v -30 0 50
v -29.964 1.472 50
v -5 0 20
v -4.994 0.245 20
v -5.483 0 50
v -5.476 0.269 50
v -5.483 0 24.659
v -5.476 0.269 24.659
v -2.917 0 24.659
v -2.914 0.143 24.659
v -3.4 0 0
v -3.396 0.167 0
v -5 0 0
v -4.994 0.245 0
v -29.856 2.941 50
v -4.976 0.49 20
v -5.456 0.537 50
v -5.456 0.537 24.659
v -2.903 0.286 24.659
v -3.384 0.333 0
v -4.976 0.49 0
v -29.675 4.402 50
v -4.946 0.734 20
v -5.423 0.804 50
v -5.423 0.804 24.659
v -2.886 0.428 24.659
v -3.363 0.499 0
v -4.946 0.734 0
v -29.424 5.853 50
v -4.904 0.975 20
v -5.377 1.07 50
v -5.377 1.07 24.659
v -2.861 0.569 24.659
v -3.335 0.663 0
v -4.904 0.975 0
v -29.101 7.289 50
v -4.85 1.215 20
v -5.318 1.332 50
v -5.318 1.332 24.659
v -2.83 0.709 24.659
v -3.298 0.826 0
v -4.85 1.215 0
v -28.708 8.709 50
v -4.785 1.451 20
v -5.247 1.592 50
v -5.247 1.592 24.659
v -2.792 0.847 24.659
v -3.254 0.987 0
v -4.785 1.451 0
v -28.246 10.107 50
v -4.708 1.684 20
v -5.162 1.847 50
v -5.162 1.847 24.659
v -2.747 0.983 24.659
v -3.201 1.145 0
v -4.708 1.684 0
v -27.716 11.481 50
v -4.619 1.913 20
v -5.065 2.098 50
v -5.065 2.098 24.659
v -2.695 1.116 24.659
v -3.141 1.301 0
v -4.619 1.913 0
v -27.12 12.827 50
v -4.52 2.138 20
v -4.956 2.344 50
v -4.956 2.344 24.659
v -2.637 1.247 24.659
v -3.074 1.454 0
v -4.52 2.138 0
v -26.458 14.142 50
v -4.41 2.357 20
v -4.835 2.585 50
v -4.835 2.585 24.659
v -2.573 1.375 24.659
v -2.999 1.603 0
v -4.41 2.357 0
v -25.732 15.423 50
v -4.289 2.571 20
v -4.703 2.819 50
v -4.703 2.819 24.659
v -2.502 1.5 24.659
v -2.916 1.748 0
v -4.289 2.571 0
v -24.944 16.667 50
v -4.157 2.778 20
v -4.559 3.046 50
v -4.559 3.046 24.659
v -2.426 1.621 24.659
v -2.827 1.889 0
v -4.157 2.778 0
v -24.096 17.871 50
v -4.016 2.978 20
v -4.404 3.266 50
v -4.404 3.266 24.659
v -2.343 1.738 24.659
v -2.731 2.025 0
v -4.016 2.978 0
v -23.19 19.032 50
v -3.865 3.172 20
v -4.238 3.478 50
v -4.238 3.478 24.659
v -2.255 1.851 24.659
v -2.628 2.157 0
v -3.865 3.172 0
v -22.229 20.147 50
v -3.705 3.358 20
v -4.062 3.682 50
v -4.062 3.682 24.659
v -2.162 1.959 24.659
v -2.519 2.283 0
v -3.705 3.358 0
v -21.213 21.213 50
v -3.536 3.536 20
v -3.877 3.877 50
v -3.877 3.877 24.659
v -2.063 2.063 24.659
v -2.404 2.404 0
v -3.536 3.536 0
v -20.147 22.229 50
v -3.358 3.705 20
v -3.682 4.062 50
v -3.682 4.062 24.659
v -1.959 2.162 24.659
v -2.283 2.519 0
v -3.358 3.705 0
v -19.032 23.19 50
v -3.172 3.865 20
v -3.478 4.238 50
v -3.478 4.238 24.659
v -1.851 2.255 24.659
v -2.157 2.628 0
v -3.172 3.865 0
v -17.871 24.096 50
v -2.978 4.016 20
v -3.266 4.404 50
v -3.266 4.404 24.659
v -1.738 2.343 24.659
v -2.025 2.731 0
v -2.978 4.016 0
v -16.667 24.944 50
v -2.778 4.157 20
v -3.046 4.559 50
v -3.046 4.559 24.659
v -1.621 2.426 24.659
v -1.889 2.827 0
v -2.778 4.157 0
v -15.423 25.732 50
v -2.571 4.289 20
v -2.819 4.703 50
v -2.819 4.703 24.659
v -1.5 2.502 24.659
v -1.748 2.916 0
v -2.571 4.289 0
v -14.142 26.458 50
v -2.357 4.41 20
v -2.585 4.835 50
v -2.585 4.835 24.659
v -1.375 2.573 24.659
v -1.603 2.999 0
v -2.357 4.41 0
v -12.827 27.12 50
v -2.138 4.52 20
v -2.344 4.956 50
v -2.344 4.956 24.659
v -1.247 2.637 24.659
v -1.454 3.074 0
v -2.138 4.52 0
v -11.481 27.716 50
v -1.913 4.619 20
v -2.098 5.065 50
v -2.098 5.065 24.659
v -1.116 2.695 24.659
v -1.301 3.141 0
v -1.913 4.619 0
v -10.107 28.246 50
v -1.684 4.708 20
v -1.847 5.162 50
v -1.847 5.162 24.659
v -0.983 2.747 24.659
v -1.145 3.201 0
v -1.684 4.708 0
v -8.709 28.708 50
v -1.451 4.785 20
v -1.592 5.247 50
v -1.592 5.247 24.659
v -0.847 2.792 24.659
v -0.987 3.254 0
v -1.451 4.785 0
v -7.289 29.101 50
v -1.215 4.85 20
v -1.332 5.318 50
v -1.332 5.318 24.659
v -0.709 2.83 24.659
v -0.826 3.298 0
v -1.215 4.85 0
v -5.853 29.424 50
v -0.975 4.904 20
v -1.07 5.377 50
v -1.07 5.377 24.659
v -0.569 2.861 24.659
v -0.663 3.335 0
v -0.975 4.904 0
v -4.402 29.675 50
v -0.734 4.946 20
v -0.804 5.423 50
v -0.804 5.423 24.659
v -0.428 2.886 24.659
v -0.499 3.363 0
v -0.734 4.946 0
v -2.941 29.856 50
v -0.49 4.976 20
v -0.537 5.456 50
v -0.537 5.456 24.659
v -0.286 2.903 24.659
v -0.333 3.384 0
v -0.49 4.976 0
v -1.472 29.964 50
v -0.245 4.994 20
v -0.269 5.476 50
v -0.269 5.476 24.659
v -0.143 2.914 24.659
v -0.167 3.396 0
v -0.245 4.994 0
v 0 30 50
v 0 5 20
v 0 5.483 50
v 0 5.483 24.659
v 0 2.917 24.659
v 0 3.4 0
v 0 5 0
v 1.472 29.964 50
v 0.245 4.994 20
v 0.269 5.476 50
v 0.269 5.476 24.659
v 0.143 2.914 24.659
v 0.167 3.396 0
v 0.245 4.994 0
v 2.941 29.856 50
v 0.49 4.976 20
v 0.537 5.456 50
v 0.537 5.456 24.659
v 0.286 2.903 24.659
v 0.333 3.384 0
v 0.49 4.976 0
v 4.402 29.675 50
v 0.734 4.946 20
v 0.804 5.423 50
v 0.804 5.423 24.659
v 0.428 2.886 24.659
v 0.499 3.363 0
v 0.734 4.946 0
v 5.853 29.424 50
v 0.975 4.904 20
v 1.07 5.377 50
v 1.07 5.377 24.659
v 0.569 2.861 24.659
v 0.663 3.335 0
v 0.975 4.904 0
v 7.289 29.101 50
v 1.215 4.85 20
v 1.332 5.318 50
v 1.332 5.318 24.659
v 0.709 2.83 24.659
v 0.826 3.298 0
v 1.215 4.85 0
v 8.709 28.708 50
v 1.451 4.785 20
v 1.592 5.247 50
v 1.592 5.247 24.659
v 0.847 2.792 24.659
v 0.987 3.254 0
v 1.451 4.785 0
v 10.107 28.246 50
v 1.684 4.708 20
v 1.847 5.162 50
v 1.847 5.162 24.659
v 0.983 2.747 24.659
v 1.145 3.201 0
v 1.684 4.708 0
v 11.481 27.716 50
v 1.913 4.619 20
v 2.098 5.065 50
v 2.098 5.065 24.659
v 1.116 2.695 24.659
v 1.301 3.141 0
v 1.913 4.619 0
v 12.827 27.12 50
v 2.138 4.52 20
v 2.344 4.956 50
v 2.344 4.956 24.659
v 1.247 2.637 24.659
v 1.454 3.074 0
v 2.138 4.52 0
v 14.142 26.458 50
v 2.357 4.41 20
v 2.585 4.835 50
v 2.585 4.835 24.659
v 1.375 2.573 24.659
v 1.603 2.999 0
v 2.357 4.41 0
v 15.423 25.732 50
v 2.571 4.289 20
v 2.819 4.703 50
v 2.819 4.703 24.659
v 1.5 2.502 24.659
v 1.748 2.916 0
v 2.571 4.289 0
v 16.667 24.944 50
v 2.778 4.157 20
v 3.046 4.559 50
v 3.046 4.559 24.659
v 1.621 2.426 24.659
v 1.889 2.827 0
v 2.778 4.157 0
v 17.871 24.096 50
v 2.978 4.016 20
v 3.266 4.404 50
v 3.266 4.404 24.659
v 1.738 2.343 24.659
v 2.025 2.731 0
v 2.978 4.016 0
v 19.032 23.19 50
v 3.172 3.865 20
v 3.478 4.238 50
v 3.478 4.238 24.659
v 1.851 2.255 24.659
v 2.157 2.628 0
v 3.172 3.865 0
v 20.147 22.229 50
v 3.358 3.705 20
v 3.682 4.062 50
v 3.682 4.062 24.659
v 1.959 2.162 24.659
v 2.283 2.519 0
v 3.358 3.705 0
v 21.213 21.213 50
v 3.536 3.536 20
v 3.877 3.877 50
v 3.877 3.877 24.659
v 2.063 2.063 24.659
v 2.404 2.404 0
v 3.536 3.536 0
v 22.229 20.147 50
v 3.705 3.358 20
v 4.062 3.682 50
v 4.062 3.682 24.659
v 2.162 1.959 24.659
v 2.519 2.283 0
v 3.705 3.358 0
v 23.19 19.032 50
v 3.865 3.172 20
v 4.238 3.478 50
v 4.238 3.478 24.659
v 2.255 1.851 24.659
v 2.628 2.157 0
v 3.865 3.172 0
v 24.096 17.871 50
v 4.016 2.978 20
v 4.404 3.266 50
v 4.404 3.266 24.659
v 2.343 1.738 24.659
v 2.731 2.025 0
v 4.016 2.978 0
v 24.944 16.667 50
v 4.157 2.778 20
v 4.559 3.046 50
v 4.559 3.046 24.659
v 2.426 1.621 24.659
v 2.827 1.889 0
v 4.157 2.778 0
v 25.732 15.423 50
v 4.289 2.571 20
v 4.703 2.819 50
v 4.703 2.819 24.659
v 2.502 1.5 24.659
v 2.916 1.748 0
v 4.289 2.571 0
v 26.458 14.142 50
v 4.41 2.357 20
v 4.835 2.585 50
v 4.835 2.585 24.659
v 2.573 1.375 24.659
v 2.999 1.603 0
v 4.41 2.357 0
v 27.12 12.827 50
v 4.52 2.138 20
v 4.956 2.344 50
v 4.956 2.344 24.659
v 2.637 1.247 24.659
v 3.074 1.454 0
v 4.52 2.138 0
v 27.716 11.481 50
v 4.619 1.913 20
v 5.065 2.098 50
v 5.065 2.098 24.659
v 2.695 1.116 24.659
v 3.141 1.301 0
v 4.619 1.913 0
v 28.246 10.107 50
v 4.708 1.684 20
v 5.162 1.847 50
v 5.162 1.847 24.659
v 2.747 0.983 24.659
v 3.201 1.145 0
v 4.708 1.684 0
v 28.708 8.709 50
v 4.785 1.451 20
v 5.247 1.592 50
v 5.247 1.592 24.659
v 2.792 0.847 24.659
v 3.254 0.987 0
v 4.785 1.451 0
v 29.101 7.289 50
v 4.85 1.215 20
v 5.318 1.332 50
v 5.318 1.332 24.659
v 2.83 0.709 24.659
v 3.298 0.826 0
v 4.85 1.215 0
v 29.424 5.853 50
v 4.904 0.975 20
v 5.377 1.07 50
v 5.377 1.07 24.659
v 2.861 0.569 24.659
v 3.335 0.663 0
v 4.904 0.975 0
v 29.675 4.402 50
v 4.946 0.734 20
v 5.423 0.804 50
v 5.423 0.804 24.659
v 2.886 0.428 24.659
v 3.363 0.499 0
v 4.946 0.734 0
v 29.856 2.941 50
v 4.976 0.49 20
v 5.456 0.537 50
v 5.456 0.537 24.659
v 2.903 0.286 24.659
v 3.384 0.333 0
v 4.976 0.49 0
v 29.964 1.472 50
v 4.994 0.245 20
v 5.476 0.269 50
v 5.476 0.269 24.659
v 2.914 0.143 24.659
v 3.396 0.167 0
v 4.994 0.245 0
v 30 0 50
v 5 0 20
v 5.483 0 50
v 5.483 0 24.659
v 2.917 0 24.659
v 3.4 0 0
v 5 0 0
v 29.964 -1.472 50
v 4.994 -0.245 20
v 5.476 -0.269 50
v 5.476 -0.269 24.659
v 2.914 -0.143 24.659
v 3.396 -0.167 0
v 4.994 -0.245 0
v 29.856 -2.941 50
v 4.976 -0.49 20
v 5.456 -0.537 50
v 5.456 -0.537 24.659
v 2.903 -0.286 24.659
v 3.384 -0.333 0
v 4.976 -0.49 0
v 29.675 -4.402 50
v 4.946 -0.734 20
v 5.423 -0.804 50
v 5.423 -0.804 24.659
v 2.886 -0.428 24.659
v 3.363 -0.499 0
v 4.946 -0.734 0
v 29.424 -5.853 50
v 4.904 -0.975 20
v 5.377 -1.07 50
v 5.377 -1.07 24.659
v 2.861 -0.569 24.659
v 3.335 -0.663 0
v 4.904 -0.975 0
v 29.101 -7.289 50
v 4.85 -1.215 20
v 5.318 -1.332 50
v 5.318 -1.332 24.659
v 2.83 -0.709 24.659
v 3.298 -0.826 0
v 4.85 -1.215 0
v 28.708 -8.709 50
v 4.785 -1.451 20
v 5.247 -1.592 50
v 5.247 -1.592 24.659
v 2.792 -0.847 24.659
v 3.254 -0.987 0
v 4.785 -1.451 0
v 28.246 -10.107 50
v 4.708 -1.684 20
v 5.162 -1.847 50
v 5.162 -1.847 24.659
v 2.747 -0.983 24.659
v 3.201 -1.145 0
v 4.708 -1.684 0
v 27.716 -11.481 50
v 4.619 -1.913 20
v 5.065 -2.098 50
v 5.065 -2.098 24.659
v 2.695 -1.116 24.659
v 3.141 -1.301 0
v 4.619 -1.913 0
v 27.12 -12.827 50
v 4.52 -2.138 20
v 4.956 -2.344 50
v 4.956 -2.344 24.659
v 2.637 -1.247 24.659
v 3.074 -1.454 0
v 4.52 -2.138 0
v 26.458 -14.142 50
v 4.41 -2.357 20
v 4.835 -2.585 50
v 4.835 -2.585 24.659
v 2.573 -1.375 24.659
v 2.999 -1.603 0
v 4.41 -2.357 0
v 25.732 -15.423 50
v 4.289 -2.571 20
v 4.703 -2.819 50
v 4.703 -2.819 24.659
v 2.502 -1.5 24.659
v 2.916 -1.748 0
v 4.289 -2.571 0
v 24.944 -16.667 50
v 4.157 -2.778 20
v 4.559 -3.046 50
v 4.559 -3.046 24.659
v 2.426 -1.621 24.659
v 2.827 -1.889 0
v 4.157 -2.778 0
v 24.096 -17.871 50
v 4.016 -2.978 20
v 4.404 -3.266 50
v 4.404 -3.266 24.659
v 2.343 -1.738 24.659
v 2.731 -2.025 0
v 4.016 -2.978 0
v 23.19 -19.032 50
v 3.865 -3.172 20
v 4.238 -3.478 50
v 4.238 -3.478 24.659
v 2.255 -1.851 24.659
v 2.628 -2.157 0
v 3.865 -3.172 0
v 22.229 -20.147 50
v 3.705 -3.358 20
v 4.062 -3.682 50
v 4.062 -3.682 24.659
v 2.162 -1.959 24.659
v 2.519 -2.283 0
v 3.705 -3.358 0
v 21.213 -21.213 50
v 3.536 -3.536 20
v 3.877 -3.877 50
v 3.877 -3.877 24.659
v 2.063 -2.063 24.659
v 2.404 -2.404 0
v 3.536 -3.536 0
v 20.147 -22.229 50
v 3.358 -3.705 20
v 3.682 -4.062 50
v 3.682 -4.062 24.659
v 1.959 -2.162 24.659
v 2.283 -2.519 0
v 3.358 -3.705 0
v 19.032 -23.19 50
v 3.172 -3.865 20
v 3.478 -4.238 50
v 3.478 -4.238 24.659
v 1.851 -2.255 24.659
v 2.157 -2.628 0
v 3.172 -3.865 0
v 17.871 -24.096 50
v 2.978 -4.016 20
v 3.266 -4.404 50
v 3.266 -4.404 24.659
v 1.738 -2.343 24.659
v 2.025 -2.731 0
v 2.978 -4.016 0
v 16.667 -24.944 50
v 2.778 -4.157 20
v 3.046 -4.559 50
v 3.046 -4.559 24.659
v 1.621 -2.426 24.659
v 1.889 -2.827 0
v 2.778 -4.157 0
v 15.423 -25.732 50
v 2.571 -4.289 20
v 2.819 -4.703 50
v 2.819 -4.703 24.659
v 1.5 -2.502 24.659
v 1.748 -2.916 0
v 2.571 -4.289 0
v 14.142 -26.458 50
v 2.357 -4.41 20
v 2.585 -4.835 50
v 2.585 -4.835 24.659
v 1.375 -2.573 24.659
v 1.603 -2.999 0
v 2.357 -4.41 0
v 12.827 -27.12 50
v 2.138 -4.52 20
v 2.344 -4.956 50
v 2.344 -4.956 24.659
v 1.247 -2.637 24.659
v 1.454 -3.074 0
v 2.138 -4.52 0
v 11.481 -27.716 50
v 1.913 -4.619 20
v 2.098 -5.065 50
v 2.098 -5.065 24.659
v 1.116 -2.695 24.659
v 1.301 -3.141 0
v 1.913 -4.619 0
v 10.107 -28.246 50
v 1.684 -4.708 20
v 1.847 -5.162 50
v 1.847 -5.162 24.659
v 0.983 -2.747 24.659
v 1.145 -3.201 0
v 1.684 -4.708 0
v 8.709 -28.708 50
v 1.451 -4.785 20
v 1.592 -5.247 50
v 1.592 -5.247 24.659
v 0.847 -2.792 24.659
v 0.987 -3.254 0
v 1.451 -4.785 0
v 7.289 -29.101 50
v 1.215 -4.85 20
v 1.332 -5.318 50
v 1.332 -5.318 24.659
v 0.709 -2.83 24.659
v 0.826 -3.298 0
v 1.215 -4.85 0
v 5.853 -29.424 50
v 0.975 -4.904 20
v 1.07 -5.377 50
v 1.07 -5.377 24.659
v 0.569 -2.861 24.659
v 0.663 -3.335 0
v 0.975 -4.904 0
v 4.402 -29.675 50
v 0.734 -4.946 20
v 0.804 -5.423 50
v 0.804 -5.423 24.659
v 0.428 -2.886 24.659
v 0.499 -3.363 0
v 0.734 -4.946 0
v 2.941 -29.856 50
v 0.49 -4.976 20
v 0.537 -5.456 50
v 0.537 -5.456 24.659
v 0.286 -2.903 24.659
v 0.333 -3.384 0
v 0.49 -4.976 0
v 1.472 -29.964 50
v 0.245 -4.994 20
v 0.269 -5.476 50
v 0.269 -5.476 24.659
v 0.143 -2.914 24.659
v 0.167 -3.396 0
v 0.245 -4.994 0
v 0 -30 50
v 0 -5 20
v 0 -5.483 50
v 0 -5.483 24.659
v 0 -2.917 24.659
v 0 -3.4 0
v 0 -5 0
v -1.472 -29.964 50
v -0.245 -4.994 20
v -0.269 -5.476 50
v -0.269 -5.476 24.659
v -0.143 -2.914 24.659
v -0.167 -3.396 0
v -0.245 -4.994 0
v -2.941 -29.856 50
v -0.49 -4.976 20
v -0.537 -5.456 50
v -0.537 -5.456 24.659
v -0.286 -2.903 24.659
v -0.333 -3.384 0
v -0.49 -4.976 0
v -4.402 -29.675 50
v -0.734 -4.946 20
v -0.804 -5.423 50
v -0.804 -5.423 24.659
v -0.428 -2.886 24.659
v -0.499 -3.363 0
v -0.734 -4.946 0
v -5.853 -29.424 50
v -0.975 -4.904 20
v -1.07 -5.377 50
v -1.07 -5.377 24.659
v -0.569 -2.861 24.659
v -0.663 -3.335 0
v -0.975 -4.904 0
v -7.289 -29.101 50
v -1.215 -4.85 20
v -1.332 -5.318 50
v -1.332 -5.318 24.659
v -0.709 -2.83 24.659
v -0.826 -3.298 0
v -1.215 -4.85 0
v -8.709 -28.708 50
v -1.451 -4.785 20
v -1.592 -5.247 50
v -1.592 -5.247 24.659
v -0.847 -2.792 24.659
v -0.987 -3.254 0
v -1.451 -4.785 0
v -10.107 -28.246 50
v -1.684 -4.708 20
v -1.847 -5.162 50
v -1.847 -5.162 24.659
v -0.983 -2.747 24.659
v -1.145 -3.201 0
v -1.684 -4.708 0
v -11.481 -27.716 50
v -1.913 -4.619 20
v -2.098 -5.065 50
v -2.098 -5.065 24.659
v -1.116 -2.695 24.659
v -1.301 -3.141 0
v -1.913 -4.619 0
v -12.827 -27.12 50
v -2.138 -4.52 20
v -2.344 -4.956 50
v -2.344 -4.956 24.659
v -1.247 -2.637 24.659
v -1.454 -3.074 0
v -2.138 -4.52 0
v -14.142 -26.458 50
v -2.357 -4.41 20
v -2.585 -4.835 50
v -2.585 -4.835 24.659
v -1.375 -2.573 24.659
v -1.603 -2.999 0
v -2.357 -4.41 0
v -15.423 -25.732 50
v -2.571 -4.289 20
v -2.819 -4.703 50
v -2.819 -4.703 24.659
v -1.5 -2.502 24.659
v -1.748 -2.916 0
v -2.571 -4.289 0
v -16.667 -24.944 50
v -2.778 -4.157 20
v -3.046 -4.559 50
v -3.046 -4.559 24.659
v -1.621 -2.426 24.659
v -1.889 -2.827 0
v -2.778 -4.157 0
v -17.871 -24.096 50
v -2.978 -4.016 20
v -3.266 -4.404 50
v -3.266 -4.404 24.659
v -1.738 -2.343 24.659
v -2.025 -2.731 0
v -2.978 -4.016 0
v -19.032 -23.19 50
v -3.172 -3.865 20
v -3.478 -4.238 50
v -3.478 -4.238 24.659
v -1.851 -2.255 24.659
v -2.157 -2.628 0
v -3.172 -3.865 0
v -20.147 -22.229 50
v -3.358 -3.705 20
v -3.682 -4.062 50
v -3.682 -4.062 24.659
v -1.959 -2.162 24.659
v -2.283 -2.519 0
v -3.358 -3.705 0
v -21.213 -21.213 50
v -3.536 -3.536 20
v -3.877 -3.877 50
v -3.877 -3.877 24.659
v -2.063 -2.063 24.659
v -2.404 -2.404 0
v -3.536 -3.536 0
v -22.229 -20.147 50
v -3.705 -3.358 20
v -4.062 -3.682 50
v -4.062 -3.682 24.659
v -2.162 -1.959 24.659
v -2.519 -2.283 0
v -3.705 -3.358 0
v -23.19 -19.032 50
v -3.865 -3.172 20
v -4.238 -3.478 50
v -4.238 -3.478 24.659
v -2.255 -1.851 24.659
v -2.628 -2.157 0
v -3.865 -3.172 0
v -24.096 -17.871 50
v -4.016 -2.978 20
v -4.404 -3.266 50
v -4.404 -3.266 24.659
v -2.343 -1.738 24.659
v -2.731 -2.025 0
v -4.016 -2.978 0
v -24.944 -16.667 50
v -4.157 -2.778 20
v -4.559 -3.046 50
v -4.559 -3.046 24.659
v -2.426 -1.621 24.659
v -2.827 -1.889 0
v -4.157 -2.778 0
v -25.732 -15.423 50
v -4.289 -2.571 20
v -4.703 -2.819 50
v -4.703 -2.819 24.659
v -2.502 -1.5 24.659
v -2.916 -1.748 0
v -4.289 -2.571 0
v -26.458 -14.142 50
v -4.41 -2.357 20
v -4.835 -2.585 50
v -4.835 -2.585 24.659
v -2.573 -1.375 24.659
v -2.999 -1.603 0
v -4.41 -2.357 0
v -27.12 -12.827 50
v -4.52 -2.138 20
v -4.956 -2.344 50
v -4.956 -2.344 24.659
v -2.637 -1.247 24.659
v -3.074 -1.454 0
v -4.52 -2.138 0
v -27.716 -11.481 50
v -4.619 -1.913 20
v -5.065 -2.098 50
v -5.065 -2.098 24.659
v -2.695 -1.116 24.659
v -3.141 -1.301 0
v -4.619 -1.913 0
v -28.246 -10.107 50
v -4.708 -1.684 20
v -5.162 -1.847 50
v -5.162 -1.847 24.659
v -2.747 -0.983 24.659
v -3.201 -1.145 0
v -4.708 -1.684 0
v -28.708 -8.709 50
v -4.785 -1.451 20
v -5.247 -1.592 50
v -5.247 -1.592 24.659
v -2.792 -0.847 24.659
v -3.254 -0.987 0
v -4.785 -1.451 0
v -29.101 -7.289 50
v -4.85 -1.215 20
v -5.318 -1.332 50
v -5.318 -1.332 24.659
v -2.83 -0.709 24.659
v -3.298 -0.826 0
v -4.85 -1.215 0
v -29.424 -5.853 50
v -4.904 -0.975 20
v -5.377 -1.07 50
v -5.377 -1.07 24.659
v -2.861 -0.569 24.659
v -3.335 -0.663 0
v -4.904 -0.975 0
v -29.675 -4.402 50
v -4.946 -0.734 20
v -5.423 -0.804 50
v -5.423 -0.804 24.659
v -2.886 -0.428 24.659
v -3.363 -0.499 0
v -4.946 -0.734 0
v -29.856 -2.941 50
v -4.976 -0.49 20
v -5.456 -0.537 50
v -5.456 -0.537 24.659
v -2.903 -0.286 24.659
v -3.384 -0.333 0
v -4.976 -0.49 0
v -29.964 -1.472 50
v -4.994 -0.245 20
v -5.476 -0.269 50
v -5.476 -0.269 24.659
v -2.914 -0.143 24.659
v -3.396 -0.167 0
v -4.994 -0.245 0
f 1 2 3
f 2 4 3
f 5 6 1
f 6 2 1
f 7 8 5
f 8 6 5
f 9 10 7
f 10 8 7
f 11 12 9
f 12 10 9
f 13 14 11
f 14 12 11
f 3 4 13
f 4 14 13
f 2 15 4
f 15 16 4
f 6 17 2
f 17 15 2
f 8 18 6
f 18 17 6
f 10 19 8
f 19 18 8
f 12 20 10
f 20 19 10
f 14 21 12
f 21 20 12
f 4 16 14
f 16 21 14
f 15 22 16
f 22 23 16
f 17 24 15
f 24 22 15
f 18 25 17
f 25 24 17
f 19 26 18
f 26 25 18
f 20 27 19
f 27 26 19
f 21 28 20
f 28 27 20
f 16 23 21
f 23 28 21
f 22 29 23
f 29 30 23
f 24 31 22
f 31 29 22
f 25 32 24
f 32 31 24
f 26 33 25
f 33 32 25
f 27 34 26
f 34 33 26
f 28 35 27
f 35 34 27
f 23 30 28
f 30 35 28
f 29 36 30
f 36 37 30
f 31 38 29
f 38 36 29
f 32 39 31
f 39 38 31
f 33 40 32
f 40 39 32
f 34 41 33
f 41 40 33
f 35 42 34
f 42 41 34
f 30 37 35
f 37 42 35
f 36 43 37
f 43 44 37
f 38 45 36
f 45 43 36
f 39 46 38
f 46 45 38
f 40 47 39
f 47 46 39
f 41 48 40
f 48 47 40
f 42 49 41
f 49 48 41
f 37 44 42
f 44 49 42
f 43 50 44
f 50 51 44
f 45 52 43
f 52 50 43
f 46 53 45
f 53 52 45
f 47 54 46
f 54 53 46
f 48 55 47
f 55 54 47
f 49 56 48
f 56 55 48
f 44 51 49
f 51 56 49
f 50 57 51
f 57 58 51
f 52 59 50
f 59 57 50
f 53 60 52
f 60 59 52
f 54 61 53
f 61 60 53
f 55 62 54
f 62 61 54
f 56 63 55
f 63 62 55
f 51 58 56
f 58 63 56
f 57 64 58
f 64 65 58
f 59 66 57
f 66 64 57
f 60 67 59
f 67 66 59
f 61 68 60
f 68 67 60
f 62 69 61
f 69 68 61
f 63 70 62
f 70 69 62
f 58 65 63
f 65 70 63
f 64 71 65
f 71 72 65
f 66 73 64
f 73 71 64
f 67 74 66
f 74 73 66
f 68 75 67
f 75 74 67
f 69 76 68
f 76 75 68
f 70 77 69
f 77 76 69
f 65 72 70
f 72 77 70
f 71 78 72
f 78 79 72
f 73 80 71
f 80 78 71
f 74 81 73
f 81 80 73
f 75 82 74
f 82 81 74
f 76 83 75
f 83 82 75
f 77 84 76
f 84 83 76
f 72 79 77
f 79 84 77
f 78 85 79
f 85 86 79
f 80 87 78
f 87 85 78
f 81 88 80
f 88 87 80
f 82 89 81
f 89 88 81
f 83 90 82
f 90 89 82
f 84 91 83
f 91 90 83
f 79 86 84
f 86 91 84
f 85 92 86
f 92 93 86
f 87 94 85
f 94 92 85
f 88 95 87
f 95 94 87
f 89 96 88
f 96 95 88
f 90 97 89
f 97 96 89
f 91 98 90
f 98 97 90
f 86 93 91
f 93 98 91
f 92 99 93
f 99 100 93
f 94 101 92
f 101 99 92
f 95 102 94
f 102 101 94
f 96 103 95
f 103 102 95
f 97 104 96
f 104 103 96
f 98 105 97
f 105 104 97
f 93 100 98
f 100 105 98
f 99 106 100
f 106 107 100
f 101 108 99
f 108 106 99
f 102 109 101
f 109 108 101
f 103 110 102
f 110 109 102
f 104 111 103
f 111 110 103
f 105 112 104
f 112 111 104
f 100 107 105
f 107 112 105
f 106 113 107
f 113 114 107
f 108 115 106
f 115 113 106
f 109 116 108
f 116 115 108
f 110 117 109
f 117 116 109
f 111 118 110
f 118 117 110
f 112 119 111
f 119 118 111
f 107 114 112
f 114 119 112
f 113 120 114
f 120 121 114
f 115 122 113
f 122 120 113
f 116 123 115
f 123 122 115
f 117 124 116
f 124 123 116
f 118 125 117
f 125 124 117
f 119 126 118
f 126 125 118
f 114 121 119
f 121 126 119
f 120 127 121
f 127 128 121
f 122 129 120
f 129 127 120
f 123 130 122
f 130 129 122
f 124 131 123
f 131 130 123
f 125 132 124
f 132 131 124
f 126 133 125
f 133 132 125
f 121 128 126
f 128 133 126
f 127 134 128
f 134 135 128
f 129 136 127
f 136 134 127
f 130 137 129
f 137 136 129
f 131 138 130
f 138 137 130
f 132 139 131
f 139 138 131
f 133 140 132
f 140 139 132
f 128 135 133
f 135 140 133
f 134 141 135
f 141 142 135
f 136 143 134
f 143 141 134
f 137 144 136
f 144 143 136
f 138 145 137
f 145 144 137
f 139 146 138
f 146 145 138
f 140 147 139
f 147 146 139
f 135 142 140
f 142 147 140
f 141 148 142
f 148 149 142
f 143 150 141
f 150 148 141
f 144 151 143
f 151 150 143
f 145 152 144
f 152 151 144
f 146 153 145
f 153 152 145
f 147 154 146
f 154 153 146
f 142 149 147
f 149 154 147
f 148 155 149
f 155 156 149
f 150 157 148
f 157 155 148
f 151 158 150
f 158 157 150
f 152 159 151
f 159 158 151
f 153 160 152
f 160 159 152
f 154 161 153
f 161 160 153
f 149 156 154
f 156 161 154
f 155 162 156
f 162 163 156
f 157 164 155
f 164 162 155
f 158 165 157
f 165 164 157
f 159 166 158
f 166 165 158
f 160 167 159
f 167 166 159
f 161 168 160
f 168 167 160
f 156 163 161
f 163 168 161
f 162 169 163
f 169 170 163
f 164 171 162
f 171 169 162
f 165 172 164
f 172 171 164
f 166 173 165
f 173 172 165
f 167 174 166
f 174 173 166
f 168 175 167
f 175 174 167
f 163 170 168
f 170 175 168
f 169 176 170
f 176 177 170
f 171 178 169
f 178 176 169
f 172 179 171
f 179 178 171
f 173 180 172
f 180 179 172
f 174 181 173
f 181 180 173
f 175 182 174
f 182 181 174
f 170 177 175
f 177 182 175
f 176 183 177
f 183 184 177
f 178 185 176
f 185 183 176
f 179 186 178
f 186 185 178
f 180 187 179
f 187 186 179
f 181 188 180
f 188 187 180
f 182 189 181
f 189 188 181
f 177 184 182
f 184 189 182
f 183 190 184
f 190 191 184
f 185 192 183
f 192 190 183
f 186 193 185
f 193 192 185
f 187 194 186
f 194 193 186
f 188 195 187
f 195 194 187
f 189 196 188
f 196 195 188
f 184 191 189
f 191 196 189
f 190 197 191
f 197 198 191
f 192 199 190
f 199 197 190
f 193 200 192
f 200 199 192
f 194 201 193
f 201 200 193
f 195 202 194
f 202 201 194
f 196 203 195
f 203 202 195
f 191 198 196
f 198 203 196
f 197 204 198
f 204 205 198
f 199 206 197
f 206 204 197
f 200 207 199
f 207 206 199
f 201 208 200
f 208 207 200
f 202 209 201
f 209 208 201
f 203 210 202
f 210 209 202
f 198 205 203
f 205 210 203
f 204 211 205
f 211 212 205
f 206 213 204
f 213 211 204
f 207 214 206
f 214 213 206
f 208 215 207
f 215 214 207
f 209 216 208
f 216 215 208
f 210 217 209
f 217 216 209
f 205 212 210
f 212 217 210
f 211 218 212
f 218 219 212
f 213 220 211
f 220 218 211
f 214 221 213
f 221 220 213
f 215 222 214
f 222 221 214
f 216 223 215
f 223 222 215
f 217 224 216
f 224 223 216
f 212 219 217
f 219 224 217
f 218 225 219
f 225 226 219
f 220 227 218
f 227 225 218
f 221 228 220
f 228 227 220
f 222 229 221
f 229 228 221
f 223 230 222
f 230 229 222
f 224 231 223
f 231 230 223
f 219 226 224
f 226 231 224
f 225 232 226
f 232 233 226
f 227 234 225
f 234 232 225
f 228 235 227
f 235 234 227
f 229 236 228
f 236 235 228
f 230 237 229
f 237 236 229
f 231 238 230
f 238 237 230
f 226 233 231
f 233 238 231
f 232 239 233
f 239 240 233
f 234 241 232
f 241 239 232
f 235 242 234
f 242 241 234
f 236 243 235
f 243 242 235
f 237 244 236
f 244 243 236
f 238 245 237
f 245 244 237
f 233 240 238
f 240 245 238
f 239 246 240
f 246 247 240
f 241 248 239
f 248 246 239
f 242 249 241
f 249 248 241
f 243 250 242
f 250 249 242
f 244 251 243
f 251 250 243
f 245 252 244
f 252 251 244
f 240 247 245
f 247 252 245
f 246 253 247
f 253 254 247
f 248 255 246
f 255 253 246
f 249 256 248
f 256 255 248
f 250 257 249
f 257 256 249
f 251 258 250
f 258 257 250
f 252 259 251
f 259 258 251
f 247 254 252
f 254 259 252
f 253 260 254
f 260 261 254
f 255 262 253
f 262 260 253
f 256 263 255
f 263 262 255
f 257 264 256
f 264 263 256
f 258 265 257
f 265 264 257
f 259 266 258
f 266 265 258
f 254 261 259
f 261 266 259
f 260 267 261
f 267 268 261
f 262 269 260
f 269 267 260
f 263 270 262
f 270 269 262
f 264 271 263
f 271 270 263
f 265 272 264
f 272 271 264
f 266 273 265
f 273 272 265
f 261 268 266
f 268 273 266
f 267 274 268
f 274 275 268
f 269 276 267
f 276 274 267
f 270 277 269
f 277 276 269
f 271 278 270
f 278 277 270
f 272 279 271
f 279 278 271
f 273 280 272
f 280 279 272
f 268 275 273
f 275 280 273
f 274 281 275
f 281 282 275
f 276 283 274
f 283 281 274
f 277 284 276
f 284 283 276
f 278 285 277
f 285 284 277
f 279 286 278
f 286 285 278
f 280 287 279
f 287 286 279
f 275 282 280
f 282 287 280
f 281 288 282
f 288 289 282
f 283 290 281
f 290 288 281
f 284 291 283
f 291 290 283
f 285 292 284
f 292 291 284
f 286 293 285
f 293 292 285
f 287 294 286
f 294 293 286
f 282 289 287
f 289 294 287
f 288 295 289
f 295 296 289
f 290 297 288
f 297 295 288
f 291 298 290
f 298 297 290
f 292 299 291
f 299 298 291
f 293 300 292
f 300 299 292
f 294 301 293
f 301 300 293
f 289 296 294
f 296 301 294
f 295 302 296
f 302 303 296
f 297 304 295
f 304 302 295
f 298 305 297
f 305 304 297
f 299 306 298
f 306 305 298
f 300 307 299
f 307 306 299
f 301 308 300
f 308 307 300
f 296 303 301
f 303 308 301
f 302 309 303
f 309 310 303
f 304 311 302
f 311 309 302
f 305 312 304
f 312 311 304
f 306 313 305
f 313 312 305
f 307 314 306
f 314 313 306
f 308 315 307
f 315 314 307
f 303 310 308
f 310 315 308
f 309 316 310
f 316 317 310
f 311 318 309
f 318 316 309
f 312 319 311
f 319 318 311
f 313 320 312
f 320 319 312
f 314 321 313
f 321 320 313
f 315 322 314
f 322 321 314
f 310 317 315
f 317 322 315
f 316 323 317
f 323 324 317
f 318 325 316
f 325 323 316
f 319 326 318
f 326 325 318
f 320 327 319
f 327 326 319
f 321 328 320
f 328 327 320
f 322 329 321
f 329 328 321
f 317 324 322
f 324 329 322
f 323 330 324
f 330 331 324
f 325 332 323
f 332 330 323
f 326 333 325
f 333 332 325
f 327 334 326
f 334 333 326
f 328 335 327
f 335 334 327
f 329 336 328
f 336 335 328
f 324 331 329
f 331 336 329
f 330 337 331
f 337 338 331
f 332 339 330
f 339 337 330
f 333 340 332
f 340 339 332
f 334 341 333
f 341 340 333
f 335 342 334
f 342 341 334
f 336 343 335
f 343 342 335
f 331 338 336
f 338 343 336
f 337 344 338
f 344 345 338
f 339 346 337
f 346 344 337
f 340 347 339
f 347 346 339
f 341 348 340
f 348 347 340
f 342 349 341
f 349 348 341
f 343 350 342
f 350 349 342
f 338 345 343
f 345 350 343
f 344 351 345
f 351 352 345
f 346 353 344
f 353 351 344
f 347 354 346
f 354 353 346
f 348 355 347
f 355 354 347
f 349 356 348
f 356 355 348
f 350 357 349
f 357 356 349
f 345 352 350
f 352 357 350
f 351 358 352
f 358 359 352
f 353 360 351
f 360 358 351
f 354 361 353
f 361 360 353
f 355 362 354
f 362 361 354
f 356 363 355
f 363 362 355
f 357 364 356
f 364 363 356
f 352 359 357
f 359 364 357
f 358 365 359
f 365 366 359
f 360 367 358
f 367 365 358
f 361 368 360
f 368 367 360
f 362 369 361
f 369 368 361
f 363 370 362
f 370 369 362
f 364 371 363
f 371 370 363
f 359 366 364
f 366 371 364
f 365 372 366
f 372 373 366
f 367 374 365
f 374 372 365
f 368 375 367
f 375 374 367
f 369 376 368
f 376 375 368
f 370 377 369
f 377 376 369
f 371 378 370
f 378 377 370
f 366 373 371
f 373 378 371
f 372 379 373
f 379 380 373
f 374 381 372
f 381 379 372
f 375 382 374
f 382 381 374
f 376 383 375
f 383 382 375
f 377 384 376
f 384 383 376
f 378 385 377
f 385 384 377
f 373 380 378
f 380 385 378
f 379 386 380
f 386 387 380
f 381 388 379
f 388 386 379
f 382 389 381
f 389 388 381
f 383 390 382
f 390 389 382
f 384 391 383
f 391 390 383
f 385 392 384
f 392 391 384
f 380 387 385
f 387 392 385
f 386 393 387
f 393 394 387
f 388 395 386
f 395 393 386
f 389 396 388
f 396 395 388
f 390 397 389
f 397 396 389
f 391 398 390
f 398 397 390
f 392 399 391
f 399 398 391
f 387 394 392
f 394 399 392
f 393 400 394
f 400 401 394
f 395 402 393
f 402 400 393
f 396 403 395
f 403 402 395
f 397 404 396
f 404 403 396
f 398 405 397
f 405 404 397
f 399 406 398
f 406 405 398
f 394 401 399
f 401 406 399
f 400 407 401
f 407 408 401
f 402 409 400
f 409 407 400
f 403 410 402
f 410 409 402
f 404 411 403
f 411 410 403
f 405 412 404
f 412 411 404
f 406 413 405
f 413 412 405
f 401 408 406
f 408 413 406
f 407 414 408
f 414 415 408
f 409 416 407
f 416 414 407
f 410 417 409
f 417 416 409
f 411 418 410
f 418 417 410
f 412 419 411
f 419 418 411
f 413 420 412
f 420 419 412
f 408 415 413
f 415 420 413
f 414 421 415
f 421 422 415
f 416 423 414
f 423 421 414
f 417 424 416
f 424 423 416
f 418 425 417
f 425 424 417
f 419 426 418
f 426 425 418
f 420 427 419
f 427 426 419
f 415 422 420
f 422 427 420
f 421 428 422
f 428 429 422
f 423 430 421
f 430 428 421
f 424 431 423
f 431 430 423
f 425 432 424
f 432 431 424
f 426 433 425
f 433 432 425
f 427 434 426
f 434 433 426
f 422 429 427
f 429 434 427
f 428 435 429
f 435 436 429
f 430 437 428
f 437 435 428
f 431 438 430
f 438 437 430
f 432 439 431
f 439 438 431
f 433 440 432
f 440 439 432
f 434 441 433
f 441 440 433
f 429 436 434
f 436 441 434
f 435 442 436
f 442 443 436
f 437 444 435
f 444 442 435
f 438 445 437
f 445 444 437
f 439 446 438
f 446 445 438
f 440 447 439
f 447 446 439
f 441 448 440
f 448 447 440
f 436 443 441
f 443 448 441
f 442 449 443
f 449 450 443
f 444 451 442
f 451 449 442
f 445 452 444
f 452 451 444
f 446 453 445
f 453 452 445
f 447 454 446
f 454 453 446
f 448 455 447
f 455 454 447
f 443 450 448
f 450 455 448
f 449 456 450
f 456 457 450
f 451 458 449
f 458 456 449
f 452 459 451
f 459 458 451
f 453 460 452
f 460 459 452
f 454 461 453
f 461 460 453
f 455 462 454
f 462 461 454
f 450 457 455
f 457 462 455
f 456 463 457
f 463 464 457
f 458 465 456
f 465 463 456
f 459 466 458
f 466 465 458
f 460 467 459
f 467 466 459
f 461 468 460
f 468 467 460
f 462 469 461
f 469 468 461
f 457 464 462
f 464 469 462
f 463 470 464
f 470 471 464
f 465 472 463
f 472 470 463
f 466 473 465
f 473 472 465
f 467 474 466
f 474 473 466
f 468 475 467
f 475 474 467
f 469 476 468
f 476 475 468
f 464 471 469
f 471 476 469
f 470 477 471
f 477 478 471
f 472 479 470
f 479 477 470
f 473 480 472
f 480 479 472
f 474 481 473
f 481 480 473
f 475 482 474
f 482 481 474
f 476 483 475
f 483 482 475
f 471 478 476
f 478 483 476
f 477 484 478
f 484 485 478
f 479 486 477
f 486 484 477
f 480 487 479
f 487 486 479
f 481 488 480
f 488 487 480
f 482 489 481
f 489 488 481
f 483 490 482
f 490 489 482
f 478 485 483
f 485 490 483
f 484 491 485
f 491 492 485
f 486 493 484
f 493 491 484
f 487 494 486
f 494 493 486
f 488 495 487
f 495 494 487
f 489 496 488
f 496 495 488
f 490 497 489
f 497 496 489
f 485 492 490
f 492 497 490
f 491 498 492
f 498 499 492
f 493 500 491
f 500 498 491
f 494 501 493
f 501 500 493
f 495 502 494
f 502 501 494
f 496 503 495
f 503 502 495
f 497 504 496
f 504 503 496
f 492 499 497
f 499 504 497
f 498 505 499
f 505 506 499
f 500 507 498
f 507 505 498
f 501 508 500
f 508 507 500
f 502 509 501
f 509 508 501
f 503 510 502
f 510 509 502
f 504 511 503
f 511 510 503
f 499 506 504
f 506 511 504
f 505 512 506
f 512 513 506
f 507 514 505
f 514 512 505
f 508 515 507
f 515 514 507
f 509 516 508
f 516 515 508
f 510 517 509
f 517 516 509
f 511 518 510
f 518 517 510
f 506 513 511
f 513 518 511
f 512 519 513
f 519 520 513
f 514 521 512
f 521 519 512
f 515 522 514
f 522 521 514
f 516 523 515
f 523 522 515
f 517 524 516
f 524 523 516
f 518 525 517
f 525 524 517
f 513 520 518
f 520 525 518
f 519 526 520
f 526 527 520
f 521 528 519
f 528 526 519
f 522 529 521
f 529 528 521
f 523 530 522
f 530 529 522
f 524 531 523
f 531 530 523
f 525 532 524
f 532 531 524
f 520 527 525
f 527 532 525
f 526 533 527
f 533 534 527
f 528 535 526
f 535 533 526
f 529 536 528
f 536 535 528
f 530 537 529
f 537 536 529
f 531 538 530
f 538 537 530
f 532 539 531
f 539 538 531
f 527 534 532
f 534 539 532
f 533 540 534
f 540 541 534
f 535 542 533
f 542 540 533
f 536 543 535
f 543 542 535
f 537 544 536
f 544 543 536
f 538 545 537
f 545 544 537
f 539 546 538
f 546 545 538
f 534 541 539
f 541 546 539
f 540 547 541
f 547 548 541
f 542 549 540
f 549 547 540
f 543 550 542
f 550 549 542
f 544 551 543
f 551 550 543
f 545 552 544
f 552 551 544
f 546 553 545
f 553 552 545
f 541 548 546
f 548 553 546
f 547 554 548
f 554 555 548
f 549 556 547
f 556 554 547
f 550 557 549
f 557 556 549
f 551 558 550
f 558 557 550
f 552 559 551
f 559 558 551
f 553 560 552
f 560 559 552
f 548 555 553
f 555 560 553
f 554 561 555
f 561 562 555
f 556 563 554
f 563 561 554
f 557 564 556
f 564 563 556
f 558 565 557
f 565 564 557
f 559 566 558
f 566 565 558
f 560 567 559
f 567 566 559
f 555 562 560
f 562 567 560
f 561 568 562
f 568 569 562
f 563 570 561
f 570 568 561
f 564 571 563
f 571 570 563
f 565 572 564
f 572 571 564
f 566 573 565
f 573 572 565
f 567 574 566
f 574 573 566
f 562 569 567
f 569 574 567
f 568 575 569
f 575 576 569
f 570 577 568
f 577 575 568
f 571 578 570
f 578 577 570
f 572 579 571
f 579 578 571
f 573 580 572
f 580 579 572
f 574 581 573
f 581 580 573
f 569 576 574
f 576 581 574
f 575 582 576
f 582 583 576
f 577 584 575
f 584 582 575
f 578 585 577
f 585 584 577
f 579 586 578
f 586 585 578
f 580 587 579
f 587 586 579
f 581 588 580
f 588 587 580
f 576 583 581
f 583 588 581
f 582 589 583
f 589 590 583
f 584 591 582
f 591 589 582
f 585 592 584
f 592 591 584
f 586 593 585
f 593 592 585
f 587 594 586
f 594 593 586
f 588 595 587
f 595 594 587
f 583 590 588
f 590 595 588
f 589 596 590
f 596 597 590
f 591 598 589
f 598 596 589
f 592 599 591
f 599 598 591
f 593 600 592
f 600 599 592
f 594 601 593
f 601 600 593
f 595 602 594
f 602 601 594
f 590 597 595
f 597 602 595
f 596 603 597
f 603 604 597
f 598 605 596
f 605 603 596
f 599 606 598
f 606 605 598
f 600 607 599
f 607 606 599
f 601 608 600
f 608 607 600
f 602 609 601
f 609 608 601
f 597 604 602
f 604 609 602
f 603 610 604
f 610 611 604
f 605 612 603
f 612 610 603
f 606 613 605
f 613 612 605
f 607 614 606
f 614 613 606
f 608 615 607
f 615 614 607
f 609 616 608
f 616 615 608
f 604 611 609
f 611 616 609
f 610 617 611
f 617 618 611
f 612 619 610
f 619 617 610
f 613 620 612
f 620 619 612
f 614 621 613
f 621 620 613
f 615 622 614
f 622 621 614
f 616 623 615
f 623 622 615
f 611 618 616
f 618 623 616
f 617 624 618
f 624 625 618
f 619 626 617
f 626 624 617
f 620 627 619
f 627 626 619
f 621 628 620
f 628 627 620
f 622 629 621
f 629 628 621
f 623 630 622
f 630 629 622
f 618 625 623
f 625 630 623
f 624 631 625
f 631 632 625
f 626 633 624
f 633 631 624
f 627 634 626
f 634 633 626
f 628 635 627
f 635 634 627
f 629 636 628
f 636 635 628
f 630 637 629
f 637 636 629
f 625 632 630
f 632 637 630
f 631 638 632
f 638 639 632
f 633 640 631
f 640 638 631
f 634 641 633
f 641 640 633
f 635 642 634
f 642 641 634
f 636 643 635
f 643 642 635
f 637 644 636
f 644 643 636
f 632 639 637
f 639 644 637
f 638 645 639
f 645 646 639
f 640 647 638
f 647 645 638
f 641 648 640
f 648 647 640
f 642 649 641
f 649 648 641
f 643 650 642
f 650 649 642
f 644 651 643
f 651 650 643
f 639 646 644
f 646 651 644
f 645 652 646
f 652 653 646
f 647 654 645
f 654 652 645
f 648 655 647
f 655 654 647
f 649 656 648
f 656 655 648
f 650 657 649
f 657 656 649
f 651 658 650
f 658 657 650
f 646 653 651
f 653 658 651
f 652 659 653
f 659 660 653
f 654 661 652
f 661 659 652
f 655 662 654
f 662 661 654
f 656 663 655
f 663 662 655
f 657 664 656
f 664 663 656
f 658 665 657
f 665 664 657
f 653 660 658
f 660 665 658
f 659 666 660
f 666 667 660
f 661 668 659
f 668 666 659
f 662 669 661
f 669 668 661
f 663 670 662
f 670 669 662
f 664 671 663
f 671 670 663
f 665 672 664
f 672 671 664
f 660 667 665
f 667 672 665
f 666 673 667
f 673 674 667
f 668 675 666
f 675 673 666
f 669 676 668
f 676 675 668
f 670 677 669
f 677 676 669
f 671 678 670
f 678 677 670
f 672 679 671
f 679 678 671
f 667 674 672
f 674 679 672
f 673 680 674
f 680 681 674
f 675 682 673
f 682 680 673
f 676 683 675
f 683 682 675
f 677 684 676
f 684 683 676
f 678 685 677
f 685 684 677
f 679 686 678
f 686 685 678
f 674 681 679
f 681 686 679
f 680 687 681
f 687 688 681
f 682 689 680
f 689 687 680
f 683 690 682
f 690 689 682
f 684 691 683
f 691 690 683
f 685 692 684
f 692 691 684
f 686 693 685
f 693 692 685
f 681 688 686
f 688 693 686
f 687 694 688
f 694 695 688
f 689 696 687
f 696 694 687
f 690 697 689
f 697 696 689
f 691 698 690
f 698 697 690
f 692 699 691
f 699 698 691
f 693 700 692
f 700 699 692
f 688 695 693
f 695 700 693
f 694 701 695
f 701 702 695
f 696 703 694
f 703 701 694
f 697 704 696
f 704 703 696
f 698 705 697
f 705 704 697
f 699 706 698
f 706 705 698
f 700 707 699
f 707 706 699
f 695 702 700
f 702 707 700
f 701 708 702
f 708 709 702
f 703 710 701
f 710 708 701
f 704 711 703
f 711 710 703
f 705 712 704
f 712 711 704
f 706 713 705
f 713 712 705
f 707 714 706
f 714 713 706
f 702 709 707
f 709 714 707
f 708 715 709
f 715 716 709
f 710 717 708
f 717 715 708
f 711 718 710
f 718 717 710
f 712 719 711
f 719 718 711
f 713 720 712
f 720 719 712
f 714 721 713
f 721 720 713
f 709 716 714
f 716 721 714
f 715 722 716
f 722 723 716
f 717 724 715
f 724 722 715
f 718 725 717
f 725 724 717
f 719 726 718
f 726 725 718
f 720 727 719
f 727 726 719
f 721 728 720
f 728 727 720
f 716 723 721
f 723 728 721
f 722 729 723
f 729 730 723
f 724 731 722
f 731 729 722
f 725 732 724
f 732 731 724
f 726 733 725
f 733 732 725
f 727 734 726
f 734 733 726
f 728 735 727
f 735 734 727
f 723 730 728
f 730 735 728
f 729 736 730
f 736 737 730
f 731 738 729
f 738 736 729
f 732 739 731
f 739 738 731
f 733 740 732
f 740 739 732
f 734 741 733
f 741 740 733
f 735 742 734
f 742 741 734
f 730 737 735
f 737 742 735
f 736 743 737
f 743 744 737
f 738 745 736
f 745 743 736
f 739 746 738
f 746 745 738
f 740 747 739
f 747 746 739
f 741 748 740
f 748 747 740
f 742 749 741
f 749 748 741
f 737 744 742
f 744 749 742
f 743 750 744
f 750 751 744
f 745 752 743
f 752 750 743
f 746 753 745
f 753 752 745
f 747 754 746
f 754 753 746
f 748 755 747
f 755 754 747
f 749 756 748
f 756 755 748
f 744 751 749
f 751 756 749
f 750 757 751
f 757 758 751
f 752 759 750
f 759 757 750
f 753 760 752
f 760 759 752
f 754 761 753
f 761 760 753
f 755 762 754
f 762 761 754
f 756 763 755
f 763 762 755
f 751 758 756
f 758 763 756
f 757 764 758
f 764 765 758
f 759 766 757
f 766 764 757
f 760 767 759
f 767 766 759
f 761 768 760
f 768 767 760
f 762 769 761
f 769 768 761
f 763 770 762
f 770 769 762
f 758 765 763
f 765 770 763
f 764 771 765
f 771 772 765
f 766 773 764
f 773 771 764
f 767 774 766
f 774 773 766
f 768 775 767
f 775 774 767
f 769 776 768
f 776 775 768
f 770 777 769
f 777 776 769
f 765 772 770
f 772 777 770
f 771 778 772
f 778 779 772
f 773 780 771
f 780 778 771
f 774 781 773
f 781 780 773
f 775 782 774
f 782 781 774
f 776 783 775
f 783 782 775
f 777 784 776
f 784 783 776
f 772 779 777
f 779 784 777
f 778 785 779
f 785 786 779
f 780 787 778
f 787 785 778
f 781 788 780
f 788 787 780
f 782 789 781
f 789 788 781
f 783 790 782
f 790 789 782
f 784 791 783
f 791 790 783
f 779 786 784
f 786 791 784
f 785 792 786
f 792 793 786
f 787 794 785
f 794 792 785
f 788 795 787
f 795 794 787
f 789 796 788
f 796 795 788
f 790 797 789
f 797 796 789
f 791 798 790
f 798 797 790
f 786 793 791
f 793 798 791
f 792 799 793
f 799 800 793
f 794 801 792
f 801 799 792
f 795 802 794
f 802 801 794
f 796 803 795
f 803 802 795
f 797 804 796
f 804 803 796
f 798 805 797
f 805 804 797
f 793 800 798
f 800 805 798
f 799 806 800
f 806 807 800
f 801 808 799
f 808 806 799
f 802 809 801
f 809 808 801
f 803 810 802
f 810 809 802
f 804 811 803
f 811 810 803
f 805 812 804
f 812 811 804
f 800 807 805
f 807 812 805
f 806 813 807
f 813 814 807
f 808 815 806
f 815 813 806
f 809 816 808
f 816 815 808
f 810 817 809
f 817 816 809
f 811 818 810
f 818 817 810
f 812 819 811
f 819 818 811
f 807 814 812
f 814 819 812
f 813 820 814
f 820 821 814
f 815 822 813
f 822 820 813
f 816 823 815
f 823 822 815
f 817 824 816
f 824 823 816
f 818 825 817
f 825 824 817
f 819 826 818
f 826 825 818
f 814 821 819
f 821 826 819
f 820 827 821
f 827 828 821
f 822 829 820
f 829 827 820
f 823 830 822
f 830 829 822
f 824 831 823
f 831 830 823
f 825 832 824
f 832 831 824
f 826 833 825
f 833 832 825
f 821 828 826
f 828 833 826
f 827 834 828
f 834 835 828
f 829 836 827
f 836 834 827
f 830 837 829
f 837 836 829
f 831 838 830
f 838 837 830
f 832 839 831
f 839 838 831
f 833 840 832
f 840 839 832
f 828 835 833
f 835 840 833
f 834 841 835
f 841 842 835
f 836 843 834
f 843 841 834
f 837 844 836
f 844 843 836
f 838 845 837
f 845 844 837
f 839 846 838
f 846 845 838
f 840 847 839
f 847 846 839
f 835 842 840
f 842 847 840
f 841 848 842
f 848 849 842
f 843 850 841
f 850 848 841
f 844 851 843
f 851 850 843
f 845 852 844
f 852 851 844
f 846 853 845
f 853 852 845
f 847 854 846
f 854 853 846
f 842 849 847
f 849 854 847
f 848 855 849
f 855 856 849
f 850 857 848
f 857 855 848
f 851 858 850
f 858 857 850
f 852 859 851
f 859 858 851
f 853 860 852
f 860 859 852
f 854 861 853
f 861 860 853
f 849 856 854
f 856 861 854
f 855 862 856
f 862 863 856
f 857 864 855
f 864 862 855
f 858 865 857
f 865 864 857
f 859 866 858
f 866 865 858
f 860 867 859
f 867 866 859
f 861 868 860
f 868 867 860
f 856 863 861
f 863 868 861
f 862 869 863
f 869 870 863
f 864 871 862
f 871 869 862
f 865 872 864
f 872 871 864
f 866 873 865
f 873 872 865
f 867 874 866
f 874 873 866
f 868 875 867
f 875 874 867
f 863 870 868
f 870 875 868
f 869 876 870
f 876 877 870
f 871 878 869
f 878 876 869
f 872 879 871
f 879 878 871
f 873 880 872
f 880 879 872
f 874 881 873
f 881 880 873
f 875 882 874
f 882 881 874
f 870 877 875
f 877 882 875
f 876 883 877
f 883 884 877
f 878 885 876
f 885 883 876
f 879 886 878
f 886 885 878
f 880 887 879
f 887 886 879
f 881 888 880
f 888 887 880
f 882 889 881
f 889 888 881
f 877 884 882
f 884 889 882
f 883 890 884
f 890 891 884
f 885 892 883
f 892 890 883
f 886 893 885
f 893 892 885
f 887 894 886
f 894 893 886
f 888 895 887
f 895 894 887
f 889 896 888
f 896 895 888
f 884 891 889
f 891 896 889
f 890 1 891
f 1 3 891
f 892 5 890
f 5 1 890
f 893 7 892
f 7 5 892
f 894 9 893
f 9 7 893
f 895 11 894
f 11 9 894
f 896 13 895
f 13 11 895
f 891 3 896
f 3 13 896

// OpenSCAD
// Small lab funnel - printed upright, wide opening at top
// Built as a single rotate_extrude of a 2D wall profile (open top and bottom)

$fn = 128;

// ---------------- Dimensions (mm) ----------------
spout_od     = 10;    // spout outer diameter
spout_h      = 20;    // spout height (z = 0 .. 20)
rim_od       = 60;    // cone outer diameter at rim
rim_z        = 50;    // rim height (top of funnel)
wall         = 1.6;   // wall thickness (normal to surface)

// ---------------- Derived values ----------------
spout_r      = spout_od / 2;                // 5.0  outer spout radius
bore_r       = spout_r - wall;              // 3.4  spout bore radius (6.8 mm bore)
rim_r        = rim_od / 2;                  // 30.0 outer rim radius
cone_h       = rim_z - spout_h;             // 30.0 cone height
cone_k       = (rim_r - spout_r) / cone_h;  // radial growth per mm of height
cone_ang     = atan(cone_k);                // cone wall angle from vertical
cone_dr      = wall / cos(cone_ang);        // horizontal offset for normal wall = 1.6
bore_r_top   = bore_r + cone_dr;            // inner radius at top of cone
// height where inner cone surface meets the spout bore
join_z       = spout_h + (bore_r_top - wall) / cone_k;

// ---------------- Wall profile (r, z) ----------------
profile = [
    [bore_r,      0],          // bottom inner edge of spout
    [spout_r,     0],          // bottom outer edge of spout
    [spout_r,     spout_h],    // top of straight spout (outer)
    [rim_r,       rim_z],      // outer rim
    [bore_r_top,  rim_z],      // inner rim
    [bore_r_top,  join_z],     // inner cone meets bore
    [spout_r - cone_dr, join_z] // outer cone meets spout (adjusted for normal wall)
];

// ---------------- Model ----------------
rotate_extrude(convexity = 4)
    polygon(points = profile);
